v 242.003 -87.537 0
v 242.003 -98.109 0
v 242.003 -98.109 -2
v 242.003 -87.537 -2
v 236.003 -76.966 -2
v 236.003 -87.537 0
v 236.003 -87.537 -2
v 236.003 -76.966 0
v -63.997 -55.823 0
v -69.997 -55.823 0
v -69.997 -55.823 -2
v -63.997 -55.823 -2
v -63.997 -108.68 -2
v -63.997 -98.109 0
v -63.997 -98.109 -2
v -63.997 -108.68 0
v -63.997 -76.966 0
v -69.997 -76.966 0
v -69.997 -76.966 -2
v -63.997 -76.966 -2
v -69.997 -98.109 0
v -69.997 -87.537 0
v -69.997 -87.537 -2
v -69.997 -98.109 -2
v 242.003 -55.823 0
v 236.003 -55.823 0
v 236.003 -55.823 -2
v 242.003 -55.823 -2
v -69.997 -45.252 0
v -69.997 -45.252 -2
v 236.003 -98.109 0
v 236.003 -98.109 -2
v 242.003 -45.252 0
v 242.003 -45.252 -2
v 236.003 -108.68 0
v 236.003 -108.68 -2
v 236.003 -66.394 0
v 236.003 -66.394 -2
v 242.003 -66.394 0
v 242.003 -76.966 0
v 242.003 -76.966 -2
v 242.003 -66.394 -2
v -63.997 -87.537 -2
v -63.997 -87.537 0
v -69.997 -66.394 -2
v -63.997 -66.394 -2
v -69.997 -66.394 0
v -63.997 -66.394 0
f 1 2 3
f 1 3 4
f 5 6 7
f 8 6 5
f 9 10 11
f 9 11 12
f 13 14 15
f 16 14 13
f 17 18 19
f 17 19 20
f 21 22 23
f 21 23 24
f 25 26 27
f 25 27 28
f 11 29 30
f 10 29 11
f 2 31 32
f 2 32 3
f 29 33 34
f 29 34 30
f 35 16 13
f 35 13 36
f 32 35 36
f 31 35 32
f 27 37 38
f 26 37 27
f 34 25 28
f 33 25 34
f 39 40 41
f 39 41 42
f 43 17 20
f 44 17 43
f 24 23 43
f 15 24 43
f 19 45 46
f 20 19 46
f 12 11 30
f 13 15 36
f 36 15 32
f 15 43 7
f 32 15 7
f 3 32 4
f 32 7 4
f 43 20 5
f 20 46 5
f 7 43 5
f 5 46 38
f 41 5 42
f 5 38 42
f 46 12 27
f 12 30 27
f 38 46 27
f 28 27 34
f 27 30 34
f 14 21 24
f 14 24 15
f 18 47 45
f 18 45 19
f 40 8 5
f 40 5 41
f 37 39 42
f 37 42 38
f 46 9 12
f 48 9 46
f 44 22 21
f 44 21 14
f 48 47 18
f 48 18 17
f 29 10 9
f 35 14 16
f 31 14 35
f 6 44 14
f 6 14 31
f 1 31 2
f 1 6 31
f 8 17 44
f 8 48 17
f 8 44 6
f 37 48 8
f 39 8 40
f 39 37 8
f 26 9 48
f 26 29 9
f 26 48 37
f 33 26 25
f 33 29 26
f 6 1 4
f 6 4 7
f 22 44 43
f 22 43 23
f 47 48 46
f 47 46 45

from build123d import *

# Parameters (mm, degrees)
BOSS_EXTRU_1_DEPTH = 2


with BuildPart() as part:
    # Esquisse1 → Boss.-Extru.1 (new body)
    with BuildSketch(Plane.XY):
        Polygon((-63.997372642, -108.680130338), (236.002627358, -108.680130338), (236.002627358, -98.108701767), (242.002627358, -98.108701767), (242.002627358, -87.537273195), (236.002627358, -87.537273195), (236.002627358, -76.965844624), (242.002627358, -76.965844624), (242.002627358, -66.394416052), (236.002627358, -66.394416052), (236.002627358, -55.822987481), (242.002627358, -55.822987481), (242.002627358, -45.25155891), (-69.997372642, -45.25155891), (-69.997372642, -55.822987481), (-63.997372642, -55.822987481), (-63.997372642, -66.394416052), (-69.997372642, -66.394416052), (-69.997372642, -76.965844624), (-63.997372642, -76.965844624), (-63.997372642, -87.537273195), (-69.997372642, -87.537273195), (-69.997372642, -98.108701767), (-63.997372642, -98.108701767), align=None)
    extrude(amount=-BOSS_EXTRU_1_DEPTH)


solid = part.part
